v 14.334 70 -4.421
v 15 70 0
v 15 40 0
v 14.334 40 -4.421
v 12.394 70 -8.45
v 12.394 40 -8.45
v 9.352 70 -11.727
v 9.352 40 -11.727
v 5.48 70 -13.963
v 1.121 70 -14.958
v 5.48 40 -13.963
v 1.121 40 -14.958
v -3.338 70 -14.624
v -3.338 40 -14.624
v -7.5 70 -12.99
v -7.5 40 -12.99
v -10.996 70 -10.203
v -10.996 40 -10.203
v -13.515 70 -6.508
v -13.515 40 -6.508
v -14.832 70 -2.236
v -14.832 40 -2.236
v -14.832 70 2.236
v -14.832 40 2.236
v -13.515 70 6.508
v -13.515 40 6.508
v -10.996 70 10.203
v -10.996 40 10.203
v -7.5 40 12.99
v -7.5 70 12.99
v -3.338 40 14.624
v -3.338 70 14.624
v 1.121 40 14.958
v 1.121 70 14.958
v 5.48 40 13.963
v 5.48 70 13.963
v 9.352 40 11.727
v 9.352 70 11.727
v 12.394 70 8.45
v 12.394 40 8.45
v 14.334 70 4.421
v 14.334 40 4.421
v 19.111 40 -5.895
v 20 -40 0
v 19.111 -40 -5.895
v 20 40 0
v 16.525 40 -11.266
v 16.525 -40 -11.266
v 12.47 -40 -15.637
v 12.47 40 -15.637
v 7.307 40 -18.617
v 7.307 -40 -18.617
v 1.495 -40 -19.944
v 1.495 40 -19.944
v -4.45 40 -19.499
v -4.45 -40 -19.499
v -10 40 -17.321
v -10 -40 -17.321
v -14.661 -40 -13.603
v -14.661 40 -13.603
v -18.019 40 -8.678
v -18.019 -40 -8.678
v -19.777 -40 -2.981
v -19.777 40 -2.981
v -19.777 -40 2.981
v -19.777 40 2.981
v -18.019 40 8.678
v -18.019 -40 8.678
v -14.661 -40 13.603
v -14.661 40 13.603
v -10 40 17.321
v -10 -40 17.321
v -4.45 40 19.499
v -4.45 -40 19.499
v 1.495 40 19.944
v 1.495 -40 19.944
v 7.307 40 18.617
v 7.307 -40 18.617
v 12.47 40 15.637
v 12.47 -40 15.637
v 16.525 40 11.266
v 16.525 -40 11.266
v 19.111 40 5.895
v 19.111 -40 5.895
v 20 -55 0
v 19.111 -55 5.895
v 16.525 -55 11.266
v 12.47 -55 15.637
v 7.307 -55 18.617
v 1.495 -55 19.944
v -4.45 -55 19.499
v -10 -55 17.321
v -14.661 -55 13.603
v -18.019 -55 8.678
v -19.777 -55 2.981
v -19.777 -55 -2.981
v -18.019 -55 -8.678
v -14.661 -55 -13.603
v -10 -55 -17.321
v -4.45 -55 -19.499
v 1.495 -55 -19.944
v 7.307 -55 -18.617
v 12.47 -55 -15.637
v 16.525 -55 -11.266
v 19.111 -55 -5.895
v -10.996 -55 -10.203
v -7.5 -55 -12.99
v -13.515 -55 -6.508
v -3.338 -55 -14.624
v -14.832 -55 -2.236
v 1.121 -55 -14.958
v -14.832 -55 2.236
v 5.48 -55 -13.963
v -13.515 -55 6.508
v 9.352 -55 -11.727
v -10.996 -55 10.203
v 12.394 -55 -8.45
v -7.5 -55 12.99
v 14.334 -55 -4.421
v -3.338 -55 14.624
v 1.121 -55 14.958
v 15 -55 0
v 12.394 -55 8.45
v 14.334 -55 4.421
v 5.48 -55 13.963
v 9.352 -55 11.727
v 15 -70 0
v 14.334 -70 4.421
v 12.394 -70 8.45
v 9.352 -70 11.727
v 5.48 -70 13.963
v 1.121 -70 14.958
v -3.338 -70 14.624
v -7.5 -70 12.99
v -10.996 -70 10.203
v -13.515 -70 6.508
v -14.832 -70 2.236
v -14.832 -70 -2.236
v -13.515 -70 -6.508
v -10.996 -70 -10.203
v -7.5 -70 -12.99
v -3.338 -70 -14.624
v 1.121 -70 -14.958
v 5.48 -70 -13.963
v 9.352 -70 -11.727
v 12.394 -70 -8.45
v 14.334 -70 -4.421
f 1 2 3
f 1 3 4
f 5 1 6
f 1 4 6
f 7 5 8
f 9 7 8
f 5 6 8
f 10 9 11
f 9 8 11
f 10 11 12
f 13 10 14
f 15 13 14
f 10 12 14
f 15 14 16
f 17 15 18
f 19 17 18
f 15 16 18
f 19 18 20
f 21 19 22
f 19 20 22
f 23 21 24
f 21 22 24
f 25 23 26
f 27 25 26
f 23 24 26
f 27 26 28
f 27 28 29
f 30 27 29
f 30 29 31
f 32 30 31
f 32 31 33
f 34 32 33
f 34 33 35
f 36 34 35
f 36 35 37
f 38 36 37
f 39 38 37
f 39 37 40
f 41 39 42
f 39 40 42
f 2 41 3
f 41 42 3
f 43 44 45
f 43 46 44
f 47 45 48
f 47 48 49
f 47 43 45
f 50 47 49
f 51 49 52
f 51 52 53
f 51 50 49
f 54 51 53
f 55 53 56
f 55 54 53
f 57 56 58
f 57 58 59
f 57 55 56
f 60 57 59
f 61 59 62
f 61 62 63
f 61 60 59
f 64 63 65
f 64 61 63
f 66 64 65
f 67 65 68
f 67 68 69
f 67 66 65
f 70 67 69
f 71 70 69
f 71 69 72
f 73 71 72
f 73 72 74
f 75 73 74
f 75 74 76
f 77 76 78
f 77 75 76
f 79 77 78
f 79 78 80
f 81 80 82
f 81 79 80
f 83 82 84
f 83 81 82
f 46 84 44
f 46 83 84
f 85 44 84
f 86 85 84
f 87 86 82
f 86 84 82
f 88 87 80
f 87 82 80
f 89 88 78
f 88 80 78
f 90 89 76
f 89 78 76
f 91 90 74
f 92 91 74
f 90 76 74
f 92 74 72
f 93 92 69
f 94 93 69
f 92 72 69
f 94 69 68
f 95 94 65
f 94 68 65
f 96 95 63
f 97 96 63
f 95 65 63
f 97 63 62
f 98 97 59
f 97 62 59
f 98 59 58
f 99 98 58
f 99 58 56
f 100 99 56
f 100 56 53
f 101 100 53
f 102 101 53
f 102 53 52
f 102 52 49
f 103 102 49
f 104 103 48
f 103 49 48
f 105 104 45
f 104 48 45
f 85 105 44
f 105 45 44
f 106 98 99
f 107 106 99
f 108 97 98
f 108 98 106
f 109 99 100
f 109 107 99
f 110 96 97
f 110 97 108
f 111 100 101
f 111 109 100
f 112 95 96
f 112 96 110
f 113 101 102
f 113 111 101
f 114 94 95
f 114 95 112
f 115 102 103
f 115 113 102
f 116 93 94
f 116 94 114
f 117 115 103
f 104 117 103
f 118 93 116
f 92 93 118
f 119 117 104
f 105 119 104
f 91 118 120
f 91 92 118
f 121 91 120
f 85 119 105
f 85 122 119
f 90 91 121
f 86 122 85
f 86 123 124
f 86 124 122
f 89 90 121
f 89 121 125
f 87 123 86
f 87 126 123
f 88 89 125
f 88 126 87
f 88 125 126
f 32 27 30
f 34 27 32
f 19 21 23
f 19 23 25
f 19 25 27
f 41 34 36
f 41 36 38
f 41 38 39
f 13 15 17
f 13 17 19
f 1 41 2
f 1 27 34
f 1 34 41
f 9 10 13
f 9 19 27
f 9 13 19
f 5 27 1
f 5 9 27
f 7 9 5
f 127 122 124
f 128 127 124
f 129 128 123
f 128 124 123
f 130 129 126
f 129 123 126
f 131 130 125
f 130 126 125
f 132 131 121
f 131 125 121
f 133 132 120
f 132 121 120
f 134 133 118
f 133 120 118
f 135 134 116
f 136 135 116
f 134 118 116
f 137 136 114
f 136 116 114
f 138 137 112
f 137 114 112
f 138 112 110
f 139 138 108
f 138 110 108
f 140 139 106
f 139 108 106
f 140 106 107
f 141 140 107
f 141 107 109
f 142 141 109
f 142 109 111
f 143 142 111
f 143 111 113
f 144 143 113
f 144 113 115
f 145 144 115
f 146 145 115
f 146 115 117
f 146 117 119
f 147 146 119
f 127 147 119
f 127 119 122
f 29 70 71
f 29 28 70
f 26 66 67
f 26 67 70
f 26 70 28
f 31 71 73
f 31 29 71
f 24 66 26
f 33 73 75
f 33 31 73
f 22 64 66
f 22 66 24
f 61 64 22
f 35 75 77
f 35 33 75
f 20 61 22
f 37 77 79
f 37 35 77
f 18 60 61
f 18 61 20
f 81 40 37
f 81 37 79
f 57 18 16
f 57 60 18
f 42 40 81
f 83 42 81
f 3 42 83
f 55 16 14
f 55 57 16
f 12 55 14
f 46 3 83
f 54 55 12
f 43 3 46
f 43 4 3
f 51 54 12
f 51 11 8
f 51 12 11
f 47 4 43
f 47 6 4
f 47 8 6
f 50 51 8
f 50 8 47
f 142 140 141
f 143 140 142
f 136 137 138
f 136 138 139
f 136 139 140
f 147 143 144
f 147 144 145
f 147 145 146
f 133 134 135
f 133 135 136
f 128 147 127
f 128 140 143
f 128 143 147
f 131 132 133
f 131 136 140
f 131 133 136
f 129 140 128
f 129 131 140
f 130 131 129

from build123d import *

# Parameters (mm, degrees)
SKETCH1_R           = 20
BOSS_EXTRUDE1_DEPTH = 40
SKETCH2_R           = 15
BOSS_EXTRUDE2_DEPTH = 30
SKETCH3_R           = 15
BOSS_EXTRUDE3_DEPTH = 30
SKETCH4_R           = 20
BOSS_EXTRUDE4_DEPTH = 15


with BuildPart() as part:
    # Sketch1 → Boss-Extrude1 (new body, symmetric)
    with BuildSketch(Plane(origin=(0, 0, 0), x_dir=(1, 0, 0), z_dir=(0, 1, 0))):
        Circle(SKETCH1_R)
    extrude(amount=BOSS_EXTRUDE1_DEPTH, both=True)

    # Sketch2 → Boss-Extrude2 (add)
    with BuildSketch(Plane(origin=(0, 40, 0), x_dir=(1, 0, 0), z_dir=(0, 1, 0))):
        Circle(SKETCH2_R)
    extrude(amount=BOSS_EXTRUDE2_DEPTH)

    # Sketch3 → Boss-Extrude3 (add)
    with BuildSketch(Plane.XZ.offset(40)):
        Circle(SKETCH3_R)
    extrude(amount=BOSS_EXTRUDE3_DEPTH)

    # Sketch4 → Boss-Extrude4 (add)
    with BuildSketch(Plane.XZ.offset(40)):
        Circle(SKETCH4_R)
    extrude(amount=BOSS_EXTRUDE4_DEPTH)


solid = part.part
